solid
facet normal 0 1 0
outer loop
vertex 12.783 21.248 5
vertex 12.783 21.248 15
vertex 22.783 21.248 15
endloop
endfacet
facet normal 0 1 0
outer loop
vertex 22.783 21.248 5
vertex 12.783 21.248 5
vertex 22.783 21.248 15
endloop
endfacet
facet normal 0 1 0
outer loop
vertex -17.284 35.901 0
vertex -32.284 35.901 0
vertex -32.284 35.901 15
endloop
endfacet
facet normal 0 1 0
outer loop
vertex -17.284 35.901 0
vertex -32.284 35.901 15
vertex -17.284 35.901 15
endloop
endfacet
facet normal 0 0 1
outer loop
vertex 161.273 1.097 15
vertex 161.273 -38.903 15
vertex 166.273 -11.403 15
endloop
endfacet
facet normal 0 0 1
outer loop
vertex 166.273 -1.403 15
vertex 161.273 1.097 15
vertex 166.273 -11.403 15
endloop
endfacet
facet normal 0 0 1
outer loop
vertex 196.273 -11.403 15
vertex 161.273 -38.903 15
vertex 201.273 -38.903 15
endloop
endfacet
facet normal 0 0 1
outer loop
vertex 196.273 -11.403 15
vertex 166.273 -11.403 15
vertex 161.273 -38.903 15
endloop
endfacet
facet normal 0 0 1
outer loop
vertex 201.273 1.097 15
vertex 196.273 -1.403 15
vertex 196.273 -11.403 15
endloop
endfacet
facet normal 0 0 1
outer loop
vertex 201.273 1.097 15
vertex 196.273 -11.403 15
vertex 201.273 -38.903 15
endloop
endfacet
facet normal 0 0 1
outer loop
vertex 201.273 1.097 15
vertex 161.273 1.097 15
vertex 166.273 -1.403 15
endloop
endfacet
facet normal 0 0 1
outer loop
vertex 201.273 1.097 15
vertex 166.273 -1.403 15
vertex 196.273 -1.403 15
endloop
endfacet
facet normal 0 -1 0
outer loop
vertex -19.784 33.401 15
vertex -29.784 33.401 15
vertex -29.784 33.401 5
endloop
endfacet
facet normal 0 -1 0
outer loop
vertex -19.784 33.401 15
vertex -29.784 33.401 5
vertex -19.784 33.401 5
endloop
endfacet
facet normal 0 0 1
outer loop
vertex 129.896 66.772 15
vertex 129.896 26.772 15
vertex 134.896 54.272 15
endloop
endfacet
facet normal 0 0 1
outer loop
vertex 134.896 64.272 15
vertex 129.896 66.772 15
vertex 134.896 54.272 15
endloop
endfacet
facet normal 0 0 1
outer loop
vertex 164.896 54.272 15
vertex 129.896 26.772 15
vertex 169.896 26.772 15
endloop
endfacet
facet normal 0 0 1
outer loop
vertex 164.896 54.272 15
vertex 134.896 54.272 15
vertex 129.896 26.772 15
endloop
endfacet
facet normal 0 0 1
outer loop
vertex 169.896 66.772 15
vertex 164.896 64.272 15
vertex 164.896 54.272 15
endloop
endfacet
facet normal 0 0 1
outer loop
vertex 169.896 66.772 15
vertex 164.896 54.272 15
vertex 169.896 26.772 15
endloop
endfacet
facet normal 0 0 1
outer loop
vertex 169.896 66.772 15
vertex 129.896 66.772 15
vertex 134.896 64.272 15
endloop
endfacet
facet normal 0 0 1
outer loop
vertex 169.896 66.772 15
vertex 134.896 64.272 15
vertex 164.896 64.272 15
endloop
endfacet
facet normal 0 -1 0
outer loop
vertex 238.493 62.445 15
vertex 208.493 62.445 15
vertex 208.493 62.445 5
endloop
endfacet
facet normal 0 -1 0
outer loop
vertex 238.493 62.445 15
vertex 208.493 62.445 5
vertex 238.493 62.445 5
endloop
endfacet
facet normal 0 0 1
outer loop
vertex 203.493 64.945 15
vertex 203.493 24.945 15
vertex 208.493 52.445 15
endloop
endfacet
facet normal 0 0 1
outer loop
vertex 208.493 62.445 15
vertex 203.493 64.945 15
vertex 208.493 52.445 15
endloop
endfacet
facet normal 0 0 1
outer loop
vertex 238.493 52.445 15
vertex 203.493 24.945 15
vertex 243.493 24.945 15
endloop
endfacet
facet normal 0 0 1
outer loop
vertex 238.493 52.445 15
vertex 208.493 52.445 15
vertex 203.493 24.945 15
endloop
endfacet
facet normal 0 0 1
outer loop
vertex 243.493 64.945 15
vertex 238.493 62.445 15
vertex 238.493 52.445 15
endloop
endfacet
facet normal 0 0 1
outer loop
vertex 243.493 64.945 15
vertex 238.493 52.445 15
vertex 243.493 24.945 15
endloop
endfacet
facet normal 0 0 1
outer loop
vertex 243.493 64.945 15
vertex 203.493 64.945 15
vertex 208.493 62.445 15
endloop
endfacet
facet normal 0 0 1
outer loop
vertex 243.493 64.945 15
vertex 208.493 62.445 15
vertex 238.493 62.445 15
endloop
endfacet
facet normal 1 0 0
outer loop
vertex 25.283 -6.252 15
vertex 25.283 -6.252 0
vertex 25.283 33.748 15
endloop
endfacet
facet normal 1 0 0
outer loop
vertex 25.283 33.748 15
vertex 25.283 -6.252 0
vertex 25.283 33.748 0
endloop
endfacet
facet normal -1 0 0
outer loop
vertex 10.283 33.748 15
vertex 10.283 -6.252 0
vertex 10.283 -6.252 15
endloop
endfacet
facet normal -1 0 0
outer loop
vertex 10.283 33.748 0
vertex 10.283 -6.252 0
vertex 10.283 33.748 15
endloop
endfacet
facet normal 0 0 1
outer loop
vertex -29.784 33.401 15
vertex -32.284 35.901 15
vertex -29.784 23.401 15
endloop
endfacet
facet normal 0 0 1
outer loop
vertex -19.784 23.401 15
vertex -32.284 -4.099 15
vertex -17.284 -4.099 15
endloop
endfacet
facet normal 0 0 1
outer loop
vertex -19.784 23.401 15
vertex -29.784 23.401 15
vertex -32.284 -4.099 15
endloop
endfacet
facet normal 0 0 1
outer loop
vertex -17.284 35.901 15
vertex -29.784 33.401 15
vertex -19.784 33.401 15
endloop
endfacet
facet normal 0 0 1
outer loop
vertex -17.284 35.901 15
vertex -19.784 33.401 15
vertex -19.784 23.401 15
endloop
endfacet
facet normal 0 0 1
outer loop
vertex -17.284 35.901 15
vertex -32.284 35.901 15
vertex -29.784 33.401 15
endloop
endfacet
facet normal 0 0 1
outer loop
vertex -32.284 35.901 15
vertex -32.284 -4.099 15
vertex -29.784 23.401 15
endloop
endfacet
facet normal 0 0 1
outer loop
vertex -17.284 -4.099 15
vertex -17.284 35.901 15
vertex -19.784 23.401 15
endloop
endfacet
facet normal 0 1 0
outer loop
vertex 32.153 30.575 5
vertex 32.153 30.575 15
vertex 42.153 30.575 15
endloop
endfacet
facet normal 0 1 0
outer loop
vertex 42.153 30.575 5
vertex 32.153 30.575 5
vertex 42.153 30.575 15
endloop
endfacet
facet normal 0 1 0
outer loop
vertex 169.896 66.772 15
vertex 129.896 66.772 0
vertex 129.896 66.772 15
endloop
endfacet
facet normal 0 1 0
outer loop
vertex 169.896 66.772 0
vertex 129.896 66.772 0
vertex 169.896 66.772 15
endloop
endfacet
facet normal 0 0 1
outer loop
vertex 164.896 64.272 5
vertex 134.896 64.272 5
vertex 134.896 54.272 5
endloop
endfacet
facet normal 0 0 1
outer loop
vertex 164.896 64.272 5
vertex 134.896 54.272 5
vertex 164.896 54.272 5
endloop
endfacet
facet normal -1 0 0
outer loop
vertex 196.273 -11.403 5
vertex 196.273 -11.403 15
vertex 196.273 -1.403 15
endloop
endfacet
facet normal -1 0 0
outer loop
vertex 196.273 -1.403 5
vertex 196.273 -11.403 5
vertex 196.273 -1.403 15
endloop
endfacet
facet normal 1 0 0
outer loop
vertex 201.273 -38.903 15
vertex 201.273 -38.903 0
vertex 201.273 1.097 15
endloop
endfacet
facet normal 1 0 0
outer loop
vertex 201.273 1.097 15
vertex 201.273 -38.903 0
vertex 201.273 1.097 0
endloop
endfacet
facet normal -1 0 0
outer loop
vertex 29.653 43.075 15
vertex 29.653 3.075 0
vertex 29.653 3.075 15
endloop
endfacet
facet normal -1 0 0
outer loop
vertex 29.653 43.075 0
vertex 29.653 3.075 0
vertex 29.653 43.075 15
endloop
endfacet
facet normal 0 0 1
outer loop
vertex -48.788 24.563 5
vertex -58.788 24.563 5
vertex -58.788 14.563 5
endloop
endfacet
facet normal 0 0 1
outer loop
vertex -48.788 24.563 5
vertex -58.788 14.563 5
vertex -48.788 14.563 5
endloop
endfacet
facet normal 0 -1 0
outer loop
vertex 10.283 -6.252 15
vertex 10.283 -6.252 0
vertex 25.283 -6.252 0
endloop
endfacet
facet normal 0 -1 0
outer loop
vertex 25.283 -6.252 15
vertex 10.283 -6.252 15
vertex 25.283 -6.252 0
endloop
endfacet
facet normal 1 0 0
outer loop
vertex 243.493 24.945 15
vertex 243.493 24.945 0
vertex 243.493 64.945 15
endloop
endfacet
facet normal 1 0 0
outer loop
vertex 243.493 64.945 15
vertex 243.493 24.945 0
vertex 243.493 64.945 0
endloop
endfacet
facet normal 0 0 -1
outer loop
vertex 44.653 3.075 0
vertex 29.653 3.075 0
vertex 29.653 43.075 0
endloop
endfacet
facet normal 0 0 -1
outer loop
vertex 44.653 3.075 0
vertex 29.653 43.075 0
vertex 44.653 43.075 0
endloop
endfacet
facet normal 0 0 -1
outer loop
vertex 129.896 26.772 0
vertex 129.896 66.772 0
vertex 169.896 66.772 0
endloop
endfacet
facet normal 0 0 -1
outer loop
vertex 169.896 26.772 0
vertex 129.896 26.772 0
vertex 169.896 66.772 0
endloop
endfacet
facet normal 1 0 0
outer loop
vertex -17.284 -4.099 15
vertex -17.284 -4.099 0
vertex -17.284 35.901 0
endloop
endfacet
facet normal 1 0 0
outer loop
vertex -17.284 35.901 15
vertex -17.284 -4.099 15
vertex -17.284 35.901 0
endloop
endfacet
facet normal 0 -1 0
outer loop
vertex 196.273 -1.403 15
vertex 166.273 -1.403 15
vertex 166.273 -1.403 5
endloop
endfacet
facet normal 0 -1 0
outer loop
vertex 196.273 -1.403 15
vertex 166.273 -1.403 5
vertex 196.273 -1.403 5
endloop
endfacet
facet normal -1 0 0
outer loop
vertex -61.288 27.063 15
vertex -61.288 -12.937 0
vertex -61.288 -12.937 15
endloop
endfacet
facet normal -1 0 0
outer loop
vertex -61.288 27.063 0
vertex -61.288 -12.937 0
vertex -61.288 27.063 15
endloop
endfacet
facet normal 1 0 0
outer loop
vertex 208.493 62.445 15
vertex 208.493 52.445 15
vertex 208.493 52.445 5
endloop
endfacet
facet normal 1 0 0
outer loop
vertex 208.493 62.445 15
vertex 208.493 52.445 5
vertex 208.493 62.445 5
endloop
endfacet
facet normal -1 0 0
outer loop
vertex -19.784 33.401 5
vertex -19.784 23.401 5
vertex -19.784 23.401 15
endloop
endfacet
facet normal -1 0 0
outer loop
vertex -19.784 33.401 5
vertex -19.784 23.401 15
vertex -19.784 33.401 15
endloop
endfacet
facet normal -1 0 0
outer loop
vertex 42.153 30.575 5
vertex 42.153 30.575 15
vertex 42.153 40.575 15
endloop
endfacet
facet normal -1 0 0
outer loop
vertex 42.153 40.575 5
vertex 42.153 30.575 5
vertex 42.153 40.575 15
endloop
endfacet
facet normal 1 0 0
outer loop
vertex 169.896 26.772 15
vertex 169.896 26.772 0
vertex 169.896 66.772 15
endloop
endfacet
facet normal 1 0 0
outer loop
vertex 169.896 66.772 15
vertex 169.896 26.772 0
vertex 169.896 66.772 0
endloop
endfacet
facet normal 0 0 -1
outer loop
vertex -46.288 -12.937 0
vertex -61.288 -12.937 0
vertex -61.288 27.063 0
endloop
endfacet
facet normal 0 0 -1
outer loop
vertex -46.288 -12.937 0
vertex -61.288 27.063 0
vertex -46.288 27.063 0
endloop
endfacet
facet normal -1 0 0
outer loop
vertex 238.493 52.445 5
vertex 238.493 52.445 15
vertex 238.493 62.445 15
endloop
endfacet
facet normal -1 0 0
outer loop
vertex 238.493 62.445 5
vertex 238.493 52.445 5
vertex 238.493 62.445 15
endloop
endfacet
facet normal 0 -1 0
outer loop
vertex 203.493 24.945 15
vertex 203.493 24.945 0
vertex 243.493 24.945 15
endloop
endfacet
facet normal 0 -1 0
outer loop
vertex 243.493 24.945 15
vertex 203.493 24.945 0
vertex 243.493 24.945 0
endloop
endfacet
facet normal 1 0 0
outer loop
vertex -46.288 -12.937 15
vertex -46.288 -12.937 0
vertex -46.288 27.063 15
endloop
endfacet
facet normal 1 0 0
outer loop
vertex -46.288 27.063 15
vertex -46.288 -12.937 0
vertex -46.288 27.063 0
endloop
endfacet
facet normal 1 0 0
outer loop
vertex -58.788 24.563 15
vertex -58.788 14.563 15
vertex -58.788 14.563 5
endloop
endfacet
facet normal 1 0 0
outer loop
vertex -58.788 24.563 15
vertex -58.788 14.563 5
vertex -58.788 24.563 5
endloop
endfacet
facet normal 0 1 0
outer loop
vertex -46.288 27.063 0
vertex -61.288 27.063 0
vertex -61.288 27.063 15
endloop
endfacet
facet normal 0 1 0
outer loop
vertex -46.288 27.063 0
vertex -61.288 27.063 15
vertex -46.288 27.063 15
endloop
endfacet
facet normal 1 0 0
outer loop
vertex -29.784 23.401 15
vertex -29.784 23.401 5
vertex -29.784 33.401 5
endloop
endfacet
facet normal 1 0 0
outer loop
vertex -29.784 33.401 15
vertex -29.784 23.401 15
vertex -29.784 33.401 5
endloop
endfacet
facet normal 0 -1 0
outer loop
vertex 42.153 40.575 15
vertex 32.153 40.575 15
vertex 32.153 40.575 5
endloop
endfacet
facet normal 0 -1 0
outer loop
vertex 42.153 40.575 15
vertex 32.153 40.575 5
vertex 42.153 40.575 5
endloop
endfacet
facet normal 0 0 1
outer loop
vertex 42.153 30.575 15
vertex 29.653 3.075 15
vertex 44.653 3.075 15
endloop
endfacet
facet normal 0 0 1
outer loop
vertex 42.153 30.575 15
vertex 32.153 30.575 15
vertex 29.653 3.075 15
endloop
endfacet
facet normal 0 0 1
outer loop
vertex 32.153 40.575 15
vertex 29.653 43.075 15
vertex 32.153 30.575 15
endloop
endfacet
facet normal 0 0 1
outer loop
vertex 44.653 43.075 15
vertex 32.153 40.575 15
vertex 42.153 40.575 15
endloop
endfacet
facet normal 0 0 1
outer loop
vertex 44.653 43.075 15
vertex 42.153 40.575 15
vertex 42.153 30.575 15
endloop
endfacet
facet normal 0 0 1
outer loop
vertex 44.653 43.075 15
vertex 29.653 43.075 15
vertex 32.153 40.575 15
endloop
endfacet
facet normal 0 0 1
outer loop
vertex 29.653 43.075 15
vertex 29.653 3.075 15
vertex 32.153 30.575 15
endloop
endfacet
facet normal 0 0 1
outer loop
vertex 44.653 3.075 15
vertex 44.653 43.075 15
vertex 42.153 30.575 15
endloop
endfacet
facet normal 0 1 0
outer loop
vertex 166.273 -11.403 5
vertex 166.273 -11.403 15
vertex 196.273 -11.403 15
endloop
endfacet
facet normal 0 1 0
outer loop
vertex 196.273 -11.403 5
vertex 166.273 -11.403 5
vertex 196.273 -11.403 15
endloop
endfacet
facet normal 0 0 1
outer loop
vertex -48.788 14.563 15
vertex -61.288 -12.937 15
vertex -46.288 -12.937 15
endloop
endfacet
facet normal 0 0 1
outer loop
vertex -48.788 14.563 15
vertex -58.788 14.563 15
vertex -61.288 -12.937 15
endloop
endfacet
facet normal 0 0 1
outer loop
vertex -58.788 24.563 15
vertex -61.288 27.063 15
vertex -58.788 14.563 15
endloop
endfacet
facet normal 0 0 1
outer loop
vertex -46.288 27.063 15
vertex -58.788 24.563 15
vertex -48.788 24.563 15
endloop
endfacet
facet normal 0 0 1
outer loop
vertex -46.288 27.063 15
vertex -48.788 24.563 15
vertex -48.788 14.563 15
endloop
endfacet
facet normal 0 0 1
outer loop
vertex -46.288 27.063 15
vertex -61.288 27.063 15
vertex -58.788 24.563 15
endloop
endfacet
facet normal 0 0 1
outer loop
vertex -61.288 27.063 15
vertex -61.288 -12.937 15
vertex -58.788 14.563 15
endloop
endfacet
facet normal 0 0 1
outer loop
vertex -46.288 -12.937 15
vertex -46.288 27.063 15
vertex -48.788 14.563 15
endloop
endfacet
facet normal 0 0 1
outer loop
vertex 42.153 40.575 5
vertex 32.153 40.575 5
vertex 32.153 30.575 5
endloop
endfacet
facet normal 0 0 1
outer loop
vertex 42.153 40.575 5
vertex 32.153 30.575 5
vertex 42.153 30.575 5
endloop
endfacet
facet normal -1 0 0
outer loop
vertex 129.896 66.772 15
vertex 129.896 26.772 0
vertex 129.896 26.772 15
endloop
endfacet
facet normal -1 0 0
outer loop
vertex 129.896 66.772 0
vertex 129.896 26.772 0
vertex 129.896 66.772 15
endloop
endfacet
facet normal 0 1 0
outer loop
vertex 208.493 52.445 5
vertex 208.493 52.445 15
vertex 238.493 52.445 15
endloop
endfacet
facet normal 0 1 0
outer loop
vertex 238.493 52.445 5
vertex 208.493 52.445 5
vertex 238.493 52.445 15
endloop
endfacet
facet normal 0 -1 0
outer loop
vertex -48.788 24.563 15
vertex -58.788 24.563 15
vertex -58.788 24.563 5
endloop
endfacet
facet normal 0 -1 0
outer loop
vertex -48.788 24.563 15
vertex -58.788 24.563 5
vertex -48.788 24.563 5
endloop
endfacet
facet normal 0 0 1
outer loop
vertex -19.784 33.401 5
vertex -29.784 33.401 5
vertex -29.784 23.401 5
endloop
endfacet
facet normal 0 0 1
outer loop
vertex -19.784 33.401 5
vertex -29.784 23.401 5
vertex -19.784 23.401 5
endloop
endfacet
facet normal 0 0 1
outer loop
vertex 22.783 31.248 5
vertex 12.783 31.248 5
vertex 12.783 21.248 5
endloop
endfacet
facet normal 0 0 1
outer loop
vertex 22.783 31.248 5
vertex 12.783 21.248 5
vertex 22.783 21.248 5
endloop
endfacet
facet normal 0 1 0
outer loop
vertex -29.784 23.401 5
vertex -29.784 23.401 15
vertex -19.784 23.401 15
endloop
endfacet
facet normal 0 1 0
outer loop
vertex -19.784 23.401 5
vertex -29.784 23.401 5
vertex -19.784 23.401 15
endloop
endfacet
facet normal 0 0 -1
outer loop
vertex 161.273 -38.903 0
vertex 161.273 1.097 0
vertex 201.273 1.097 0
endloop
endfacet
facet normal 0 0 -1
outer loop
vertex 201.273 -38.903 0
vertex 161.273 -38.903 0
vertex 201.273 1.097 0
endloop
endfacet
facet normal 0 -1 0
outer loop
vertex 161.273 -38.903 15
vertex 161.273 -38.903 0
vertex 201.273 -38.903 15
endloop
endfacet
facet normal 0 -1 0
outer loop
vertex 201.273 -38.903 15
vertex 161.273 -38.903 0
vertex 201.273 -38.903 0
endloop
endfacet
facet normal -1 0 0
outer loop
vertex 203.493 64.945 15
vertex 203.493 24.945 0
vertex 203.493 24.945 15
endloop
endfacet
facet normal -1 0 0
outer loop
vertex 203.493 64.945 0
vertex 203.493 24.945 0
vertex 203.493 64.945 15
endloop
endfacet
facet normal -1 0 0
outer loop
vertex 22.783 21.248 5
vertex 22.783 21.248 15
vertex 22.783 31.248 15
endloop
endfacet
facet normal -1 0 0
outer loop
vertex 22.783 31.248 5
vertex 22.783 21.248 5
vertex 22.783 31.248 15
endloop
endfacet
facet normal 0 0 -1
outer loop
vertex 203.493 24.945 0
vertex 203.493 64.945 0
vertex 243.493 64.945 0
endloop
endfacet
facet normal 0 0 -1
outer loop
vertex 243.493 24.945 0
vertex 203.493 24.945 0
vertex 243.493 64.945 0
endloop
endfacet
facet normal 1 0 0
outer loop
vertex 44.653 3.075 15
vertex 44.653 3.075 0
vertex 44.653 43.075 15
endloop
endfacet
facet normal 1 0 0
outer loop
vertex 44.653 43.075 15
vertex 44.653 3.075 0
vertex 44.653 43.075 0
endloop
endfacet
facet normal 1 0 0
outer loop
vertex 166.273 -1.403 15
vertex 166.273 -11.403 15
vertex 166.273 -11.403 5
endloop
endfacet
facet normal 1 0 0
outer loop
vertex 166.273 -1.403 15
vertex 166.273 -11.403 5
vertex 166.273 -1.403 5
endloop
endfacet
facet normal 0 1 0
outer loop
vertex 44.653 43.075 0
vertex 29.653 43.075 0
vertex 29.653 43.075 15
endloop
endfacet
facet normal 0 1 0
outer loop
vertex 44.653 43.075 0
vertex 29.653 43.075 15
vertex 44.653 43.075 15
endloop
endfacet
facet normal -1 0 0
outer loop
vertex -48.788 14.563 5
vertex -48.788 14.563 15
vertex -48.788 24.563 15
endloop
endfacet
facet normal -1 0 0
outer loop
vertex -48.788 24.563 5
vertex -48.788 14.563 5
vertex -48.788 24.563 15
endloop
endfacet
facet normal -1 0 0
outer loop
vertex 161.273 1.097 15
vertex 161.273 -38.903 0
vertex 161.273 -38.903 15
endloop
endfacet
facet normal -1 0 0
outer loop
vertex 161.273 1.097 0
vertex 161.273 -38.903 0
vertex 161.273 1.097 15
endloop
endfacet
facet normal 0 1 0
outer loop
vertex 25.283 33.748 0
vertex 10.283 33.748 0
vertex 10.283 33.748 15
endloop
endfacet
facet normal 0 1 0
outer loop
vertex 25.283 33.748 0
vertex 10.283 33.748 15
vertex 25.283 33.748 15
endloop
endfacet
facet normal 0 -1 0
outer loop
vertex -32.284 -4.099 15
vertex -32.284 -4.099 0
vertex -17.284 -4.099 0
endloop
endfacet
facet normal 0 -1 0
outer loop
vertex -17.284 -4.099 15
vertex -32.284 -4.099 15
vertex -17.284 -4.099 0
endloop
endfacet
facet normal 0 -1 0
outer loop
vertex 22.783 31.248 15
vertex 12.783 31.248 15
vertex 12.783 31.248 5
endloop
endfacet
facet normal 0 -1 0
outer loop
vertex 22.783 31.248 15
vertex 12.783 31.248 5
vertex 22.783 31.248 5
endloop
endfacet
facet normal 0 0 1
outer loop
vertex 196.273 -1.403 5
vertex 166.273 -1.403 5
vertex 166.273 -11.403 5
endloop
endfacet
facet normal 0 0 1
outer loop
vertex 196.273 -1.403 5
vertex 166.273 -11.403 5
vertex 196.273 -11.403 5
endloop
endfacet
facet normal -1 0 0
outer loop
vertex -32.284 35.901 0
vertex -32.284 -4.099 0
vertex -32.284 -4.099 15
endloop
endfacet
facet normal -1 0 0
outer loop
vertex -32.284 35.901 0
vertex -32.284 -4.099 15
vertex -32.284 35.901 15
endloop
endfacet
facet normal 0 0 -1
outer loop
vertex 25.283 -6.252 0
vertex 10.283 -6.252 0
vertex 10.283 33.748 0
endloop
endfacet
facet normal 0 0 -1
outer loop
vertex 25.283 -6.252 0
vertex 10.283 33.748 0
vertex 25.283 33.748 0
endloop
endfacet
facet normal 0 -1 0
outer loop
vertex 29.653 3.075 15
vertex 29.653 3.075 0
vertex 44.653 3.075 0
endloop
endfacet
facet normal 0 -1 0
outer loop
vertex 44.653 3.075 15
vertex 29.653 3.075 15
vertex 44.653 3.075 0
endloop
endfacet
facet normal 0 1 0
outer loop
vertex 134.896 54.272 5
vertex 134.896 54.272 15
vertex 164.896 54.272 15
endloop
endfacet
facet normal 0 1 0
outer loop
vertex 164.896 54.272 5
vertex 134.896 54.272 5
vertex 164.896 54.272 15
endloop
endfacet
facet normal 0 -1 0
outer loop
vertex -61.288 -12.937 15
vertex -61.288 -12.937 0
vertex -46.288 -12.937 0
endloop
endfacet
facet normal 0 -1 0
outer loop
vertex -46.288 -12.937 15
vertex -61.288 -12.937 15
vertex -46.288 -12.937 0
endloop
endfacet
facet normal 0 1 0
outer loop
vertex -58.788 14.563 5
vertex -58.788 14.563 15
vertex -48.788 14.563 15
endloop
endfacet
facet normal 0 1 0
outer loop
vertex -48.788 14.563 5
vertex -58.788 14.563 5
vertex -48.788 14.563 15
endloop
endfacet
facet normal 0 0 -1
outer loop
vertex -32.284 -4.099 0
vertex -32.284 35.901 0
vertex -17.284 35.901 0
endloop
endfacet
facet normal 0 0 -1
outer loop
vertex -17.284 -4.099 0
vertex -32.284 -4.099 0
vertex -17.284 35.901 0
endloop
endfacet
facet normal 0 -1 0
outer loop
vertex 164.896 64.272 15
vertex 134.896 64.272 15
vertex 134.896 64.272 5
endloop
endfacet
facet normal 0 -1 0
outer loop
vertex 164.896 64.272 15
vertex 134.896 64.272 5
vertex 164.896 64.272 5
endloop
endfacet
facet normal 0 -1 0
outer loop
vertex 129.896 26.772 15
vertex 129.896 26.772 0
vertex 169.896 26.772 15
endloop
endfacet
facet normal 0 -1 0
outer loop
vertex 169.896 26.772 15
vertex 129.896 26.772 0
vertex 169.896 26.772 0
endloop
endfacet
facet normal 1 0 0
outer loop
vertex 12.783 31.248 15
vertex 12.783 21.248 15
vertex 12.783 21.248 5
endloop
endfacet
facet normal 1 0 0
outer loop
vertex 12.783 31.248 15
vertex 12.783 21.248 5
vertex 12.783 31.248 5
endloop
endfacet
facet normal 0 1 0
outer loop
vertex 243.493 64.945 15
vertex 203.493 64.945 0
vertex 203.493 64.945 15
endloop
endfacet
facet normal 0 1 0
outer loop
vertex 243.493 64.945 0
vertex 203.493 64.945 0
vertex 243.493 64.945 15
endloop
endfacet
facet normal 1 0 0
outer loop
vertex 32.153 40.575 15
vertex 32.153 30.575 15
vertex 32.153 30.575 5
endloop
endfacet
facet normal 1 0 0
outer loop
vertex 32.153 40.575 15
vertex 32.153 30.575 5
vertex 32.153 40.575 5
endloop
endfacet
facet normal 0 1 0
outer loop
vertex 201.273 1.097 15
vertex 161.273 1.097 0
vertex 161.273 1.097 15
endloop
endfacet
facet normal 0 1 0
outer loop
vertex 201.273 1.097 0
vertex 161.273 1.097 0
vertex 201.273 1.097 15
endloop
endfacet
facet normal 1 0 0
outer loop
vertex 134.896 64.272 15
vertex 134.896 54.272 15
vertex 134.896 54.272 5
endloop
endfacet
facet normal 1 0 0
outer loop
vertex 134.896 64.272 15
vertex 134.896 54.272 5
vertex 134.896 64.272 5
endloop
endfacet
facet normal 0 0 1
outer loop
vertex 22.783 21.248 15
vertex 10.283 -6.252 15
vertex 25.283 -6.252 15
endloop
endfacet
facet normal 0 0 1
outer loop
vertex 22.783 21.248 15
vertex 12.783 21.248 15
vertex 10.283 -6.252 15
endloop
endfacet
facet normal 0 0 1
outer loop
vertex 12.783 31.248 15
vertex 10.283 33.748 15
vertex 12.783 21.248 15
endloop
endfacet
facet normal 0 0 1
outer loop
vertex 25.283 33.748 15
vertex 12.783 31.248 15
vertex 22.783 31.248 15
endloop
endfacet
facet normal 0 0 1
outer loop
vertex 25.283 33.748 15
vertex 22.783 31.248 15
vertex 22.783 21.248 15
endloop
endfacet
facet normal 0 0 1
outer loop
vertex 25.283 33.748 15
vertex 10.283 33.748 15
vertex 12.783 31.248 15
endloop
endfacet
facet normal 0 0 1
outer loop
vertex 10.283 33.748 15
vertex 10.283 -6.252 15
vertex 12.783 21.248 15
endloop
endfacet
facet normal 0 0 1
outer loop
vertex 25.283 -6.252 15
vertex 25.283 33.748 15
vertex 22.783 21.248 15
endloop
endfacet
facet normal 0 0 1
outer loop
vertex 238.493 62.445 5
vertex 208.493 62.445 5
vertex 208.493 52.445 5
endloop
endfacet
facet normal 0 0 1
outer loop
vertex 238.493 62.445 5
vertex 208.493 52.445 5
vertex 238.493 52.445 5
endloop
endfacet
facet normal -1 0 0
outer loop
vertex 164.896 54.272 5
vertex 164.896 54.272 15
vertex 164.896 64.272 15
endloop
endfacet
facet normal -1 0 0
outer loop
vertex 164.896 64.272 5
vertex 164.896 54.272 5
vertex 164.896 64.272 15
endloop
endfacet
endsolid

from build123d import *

# Parameters (mm, degrees)
F0_W      = 15
F0_H      = 40
F1_DEPTH  = 15
F2_W      = 10
F2_H      = 10
F3_W      = 10
F3_H      = 10
F4_W      = 10
F4_H      = 10
F5_W      = 10
F5_H      = 10
F6_DEPTH  = 10
F7_DEPTH  = 10
F8_DEPTH  = 10
F9_DEPTH  = 10
F10_W     = 40
F10_H     = 40
F11_DEPTH = 15
F12_W     = 30
F12_H     = 10
F13_DEPTH = 10
F14_DEPTH = 10
F15_DEPTH = 10


with BuildPart() as f1:
    # F0 (on Top) → F1 (new body)
    with BuildSketch(Plane.XY):
        with Locations((-53.787847, 7.063454)):
            Rectangle(F0_W, F0_H)
        with Locations((-24.784097, 15.900724)):
            Rectangle(F0_W, F0_H)
        with Locations((17.78272, 13.748469)):
            Rectangle(F0_W, F0_H)
        with Locations((37.153013, 23.074906)):
            Rectangle(F0_W, F0_H)
    extrude(amount=F1_DEPTH)

    # F2 (on face) + F3 (on face) + F4 (on face) + F5 (on face) → F6 (cut)
    with BuildSketch(Plane.XY.offset(15)):
        with Locations((-53.787847, 19.563454)):
            Rectangle(F2_W, F2_H)
    with BuildSketch(Plane.XY.offset(15)):
        with Locations((-24.784097, 28.400724)):
            Rectangle(F3_W, F3_H)
    with BuildSketch(Plane.XY.offset(15)):
        with Locations((17.78272, 26.248469)):
            Rectangle(F4_W, F4_H)
    with BuildSketch(Plane.XY.offset(15)):
        with Locations((37.153013, 35.574906)):
            Rectangle(F5_W, F5_H)
    extrude(amount=-F6_DEPTH, mode=Mode.SUBTRACT)

    # F3 (on face) → F7 (cut)
    with BuildSketch(Plane.XY.offset(15)):
        with Locations((-24.784097, 28.400724)):
            Rectangle(F3_W, F3_H)
    extrude(amount=-F7_DEPTH, mode=Mode.SUBTRACT)

    # F4 (on face) → F8 (cut)
    with BuildSketch(Plane.XY.offset(15)):
        with Locations((17.78272, 26.248469)):
            Rectangle(F4_W, F4_H)
    extrude(amount=-F8_DEPTH, mode=Mode.SUBTRACT)

    # F5 (on face) → F9 (cut)
    with BuildSketch(Plane.XY.offset(15)):
        with Locations((37.153013, 35.574906)):
            Rectangle(F5_W, F5_H)
    extrude(amount=-F9_DEPTH, mode=Mode.SUBTRACT)


with BuildPart() as f11:
    # F10 (on Top) → F11 (new body)
    with BuildSketch(Plane.XY):
        with Locations((149.896219, 46.772019)):
            Rectangle(F10_W, F10_H)
        with Locations((223.493338, 44.944856)):
            Rectangle(F10_W, F10_H)
        with Locations((181.273296, -18.903233)):
            Rectangle(F10_W, F10_H)
    extrude(amount=F11_DEPTH)

    # F12 (on face) → F13 (cut)
    with BuildSketch(Plane.XY.offset(15)):
        with Locations((149.896219, 59.272019)):
            Rectangle(F12_W, F12_H)
    extrude(amount=-F13_DEPTH, mode=Mode.SUBTRACT)

    # F12 (on face) → F14 (cut)
    with BuildSketch(Plane.XY.offset(15)):
        with Locations((223.493338, 57.444856)):
            Rectangle(F12_W, F12_H)
    extrude(amount=-F14_DEPTH, mode=Mode.SUBTRACT)

    # F12 (on face) → F15 (cut)
    with BuildSketch(Plane.XY.offset(15)):
        with Locations((181.273296, -6.403233)):
            Rectangle(F12_W, F12_H)
    extrude(amount=-F15_DEPTH, mode=Mode.SUBTRACT)


solid = Compound([f1.part, f11.part])
